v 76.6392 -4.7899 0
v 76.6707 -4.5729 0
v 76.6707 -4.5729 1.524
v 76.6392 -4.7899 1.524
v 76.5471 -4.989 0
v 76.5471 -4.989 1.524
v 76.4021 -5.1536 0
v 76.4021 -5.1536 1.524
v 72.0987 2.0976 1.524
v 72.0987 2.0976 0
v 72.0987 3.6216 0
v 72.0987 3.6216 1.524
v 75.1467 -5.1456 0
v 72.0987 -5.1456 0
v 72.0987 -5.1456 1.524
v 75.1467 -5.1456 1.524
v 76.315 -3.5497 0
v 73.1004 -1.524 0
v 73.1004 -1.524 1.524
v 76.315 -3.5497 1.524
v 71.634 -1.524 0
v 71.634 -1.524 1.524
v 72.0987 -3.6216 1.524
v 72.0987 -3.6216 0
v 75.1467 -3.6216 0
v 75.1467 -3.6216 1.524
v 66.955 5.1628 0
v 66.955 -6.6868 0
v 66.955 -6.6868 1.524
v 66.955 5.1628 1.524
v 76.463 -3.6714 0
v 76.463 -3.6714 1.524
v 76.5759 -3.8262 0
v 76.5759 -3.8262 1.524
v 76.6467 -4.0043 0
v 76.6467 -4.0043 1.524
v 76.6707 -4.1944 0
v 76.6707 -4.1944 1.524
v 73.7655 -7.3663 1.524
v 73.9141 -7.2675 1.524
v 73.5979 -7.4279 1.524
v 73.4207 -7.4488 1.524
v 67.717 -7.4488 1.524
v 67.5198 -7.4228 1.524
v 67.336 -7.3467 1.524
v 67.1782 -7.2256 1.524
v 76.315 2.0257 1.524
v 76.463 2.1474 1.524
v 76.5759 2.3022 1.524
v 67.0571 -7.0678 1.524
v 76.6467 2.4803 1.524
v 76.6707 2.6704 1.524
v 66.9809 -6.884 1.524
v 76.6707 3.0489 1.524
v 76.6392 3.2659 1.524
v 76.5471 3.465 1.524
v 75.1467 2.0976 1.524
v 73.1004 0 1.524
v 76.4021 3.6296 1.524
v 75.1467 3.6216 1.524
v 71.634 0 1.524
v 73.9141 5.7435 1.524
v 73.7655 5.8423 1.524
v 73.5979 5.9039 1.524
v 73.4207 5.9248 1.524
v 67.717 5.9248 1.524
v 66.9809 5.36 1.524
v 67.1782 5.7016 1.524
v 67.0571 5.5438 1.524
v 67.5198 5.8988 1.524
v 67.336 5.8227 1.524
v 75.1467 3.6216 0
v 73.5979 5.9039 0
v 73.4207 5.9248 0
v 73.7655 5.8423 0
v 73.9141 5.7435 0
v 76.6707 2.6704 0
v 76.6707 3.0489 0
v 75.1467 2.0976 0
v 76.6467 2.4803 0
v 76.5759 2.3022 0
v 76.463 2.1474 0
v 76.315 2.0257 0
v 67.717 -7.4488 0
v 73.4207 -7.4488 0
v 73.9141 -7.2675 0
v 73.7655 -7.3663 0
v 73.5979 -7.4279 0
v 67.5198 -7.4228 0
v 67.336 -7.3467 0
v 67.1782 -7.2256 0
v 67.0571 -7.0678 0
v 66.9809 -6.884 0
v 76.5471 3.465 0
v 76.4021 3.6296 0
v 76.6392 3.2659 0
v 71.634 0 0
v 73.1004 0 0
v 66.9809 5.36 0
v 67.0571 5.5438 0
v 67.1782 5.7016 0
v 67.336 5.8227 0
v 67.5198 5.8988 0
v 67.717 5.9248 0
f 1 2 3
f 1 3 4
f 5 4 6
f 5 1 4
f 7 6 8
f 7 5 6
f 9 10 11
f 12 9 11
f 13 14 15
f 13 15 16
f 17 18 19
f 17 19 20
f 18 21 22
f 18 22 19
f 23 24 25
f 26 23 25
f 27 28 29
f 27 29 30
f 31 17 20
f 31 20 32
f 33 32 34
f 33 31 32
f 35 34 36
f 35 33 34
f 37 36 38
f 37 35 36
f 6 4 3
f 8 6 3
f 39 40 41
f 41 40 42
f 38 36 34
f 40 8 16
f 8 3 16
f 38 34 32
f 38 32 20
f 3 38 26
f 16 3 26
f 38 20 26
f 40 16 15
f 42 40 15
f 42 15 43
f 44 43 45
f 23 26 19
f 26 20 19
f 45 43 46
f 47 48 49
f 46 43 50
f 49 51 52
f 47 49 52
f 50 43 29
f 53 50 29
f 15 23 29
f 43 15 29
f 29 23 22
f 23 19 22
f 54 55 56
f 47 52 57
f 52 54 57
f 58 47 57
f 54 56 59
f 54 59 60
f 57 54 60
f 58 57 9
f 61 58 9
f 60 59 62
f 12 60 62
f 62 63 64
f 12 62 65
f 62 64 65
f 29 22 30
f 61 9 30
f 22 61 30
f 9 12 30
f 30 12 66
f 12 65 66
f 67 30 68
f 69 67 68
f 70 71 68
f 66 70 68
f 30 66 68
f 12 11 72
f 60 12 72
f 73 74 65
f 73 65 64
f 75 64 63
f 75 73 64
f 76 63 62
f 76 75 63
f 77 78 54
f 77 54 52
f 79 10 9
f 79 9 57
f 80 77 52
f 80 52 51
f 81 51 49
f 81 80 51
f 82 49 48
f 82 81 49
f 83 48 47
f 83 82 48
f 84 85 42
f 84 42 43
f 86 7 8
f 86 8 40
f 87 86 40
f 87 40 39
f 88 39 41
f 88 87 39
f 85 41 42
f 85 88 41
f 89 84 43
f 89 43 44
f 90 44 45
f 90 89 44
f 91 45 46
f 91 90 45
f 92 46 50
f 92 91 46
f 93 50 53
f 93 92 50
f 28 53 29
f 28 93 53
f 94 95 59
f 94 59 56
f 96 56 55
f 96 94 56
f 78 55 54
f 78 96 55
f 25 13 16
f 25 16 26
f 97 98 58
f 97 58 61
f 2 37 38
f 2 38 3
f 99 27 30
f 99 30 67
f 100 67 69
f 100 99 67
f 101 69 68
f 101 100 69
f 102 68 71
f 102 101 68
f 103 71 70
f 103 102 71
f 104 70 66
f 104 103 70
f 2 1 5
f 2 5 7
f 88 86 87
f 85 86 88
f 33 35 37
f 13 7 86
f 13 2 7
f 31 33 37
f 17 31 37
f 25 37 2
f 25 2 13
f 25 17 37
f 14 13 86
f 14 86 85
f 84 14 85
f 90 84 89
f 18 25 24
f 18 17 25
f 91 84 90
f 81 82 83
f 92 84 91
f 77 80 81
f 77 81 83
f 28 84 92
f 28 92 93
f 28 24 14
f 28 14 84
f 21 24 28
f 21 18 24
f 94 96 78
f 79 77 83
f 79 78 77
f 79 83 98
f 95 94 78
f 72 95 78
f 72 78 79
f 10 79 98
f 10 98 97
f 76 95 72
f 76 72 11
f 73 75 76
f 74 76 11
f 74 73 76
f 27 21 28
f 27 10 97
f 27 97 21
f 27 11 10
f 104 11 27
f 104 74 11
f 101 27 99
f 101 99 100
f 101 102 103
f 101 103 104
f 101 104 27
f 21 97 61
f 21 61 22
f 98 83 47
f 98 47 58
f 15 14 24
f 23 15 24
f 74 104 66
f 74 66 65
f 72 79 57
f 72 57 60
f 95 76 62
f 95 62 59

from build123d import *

# Parameters (mm, degrees)
SKETCH1_W           = 3.048
SKETCH1_H           = 1.524
BOSS_EXTRUDE1_DEPTH = 1.524


with BuildPart() as part:
    # Sketch1 → Boss-Extrude1 (new body)
    with BuildSketch(Plane.XY):
        with BuildLine():
            Line((71.633966028, -1.524), (73.100370076, -1.524))
            Line((73.100370076, -1.524), (76.314988323, -3.549713839))
            ThreePointArc((76.314988323, -3.549713839), (76.575900985, -3.82622986), (76.670741226, -4.194389956))
            Line((76.670741226, -4.194389956), (76.670741226, -4.572894715))
            ThreePointArc((76.670741226, -4.572894715), (76.600333337, -4.892807754), (76.402120879, -5.153601627))
            Line((76.402120879, -5.153601627), (73.914078319, -7.267489978))
            ThreePointArc((73.914078319, -7.267489978), (73.683515458, -7.402025217), (73.420698665, -7.448783066))
            Line((73.420698665, -7.448783066), (67.716985472, -7.448783066))
            ThreePointArc((67.716985472, -7.448783066), (67.178170104, -7.225598434), (66.954985472, -6.686783066))
            Line((66.954985472, -6.686783066), (66.954985472, 5.162783066))
            ThreePointArc((66.954985472, 5.162783066), (67.178170104, 5.701598434), (67.716985472, 5.924783066))
            Line((67.716985472, 5.924783066), (73.420698665, 5.924783066))
            ThreePointArc((73.420698665, 5.924783066), (73.683515458, 5.878025217), (73.914078319, 5.743489978))
            Line((73.914078319, 5.743489978), (76.402120879, 3.629601627))
            ThreePointArc((76.402120879, 3.629601627), (76.600333337, 3.368807754), (76.670741226, 3.048894715))
            Line((76.670741226, 3.048894715), (76.670741226, 2.670389956))
            ThreePointArc((76.670741226, 2.670389956), (76.575900985, 2.30222986), (76.314988323, 2.025713839))
            Line((76.314988323, 2.025713839), (73.100370076, 0))
            Line((73.100370076, 0), (71.633966028, 0))
            Line((71.633966028, 0), (71.633966028, -1.524))
        make_face()
        with Locations((73.622741226, 2.859642336)):
            Rectangle(SKETCH1_W, SKETCH1_H, mode=Mode.SUBTRACT)
        with Locations((73.622741226, -4.383642336)):
            Rectangle(SKETCH1_W, SKETCH1_H, mode=Mode.SUBTRACT)
    extrude(amount=BOSS_EXTRUDE1_DEPTH)


solid = part.part
